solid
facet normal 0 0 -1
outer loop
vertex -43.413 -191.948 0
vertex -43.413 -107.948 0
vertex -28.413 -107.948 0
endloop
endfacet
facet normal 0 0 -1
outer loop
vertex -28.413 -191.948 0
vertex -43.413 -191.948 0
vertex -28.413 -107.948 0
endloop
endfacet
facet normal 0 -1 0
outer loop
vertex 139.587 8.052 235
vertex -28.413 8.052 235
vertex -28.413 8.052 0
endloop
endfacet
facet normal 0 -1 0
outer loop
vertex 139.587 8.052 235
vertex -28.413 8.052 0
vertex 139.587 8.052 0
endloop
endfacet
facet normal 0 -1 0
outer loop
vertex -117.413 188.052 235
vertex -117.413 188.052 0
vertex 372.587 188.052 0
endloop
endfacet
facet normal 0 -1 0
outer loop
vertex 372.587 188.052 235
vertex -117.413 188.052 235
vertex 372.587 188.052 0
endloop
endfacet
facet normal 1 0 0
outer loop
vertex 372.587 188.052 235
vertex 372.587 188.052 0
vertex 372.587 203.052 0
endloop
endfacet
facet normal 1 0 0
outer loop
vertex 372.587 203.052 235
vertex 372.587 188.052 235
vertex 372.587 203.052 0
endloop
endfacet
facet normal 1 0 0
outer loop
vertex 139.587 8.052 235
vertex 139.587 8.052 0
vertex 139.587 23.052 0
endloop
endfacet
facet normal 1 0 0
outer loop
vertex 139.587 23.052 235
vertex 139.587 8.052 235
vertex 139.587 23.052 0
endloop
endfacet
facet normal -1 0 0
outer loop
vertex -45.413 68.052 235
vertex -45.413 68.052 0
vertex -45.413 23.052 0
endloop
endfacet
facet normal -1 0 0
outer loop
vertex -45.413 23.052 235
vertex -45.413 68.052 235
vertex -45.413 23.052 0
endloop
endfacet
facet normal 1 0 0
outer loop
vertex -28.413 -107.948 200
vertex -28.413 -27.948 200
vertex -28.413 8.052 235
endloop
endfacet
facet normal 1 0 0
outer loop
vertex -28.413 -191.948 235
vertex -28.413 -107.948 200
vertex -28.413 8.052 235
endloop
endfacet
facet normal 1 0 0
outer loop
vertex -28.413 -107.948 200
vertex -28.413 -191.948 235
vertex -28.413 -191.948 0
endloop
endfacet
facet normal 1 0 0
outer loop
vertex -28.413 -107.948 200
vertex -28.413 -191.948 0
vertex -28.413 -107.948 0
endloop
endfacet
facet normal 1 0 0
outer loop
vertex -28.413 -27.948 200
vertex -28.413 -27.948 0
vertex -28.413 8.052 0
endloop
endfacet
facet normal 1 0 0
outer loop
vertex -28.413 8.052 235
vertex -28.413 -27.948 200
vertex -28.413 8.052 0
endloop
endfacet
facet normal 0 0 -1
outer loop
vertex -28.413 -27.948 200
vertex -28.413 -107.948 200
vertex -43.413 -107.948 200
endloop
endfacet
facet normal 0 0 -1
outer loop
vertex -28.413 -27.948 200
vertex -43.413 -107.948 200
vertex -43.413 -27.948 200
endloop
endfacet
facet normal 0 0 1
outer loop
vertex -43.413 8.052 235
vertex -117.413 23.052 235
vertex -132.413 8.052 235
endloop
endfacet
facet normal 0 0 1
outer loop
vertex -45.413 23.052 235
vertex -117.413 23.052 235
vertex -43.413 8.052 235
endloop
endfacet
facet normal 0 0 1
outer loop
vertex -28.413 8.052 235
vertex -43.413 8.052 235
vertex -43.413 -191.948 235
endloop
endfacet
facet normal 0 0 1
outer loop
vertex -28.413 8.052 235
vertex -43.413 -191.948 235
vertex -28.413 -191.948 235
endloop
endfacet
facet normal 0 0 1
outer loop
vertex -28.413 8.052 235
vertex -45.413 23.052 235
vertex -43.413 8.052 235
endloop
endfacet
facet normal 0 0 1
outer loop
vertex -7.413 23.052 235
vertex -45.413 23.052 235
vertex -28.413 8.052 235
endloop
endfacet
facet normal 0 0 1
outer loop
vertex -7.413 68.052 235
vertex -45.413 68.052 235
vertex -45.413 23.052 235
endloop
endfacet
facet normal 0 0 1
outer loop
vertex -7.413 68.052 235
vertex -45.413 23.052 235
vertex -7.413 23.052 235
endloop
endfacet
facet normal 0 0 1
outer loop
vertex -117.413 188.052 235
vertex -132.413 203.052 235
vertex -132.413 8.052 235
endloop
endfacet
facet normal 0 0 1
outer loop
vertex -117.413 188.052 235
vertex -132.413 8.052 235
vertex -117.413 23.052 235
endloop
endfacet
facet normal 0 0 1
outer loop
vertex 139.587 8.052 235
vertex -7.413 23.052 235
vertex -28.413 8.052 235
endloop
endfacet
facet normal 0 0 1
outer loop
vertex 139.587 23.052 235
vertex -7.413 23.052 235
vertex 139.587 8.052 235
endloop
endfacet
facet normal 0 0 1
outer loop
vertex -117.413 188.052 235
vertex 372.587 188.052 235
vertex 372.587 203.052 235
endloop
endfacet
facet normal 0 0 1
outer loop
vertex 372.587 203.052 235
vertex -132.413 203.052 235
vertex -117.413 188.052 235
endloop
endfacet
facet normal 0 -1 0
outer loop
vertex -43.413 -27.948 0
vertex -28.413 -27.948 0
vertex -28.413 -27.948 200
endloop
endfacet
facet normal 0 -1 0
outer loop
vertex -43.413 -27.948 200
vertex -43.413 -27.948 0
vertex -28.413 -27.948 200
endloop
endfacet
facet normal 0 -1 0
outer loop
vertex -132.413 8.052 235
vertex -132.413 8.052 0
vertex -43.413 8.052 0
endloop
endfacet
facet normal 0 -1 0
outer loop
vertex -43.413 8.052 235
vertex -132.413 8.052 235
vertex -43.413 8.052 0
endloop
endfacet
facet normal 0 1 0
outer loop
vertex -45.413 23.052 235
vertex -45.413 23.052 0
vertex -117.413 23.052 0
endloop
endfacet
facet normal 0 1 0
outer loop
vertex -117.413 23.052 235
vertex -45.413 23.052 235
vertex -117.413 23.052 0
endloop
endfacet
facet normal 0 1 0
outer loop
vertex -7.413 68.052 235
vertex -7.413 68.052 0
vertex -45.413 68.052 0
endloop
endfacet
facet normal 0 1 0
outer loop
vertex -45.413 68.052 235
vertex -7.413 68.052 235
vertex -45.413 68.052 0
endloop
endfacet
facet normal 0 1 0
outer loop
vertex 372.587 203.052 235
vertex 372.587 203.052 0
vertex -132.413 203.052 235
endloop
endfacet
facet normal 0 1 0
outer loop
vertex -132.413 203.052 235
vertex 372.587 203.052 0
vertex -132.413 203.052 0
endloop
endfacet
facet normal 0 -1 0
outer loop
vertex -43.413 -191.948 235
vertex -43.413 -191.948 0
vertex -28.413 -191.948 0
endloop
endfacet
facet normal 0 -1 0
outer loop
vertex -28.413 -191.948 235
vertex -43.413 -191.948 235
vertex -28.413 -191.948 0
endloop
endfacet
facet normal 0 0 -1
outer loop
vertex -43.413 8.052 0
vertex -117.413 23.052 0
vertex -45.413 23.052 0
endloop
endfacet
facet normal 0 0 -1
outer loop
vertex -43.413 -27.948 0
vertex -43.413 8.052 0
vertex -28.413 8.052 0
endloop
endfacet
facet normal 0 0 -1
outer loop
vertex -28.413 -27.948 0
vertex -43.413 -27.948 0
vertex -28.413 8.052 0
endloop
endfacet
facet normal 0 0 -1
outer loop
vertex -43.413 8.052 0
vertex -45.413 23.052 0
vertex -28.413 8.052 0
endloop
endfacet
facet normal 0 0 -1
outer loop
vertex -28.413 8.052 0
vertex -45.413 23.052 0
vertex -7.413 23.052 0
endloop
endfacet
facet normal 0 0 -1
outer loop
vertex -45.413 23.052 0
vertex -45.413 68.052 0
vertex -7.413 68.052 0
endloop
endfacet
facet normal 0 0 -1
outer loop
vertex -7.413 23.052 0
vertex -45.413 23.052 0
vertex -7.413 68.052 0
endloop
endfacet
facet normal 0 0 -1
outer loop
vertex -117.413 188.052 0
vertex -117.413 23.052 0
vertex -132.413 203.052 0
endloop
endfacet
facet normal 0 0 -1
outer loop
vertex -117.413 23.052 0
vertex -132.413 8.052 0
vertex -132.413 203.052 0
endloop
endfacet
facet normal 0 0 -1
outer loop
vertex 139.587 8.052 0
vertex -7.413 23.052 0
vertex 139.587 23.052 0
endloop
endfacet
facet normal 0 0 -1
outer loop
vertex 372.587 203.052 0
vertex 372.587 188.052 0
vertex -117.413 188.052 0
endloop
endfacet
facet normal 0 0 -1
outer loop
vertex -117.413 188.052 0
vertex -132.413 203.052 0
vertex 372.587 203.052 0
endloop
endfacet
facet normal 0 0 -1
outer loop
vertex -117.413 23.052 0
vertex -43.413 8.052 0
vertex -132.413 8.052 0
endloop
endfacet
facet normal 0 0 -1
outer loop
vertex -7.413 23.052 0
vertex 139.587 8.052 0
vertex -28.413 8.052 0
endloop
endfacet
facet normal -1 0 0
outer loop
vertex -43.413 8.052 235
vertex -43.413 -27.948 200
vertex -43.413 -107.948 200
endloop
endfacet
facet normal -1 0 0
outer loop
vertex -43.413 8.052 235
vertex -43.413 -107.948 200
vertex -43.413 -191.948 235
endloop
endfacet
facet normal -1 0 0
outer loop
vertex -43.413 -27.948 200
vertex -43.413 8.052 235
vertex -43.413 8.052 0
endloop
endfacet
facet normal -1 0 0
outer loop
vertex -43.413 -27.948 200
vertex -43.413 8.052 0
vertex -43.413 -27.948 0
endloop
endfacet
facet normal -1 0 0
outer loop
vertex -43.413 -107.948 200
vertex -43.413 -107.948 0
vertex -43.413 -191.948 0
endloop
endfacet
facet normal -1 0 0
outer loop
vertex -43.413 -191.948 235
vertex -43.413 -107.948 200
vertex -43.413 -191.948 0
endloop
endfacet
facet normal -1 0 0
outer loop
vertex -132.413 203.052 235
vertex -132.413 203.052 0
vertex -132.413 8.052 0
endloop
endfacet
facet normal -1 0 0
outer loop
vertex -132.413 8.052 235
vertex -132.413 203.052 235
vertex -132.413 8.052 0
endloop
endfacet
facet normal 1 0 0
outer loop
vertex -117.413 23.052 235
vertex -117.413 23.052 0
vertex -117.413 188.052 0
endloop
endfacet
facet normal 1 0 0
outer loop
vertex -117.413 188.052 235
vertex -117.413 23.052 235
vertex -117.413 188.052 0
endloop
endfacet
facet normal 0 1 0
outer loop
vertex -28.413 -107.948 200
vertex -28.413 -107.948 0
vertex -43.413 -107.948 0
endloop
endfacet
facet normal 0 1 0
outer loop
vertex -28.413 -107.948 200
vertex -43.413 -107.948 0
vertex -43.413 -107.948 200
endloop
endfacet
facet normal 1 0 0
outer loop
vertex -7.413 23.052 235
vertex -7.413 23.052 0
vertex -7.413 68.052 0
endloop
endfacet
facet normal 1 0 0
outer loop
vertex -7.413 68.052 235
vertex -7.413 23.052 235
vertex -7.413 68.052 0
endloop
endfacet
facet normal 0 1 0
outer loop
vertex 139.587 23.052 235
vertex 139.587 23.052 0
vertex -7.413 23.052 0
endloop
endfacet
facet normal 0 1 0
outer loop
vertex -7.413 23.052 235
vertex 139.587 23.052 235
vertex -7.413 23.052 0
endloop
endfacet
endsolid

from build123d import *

# Parameters (mm, degrees)
F1_DEPTH = 235
F2_W     = 80
F2_H     = 200
F3_DEPTH = 104.001


with BuildPart() as f1:
    # F0 (on Top) → F1 (new body)
    with BuildSketch(Plane.XY):
        Polygon((-117.413361, 188.052049), (372.586639, 188.052049), (372.586639, 203.052049), (-132.413361, 203.052049), (-132.413361, 8.052049), (-43.413361, 8.052049), (-43.413361, -191.947951), (-28.413361, -191.947951), (-28.413361, 8.052049), (139.586639, 8.052049), (139.586639, 23.052049), (-7.413361, 23.052049), (-7.413361, 68.052049), (-45.413361, 68.052049), (-45.413361, 23.052049), (-117.413361, 23.052049), align=None)
    extrude(amount=F1_DEPTH)

    # F2 (on face) → F3 (cut, through all)
    with BuildSketch(Plane.YZ.offset(-28.413361)):
        with Locations((-67.947951, 100)):
            Rectangle(F2_W, F2_H)
    extrude(amount=-F3_DEPTH, mode=Mode.SUBTRACT)


solid = f1.part
